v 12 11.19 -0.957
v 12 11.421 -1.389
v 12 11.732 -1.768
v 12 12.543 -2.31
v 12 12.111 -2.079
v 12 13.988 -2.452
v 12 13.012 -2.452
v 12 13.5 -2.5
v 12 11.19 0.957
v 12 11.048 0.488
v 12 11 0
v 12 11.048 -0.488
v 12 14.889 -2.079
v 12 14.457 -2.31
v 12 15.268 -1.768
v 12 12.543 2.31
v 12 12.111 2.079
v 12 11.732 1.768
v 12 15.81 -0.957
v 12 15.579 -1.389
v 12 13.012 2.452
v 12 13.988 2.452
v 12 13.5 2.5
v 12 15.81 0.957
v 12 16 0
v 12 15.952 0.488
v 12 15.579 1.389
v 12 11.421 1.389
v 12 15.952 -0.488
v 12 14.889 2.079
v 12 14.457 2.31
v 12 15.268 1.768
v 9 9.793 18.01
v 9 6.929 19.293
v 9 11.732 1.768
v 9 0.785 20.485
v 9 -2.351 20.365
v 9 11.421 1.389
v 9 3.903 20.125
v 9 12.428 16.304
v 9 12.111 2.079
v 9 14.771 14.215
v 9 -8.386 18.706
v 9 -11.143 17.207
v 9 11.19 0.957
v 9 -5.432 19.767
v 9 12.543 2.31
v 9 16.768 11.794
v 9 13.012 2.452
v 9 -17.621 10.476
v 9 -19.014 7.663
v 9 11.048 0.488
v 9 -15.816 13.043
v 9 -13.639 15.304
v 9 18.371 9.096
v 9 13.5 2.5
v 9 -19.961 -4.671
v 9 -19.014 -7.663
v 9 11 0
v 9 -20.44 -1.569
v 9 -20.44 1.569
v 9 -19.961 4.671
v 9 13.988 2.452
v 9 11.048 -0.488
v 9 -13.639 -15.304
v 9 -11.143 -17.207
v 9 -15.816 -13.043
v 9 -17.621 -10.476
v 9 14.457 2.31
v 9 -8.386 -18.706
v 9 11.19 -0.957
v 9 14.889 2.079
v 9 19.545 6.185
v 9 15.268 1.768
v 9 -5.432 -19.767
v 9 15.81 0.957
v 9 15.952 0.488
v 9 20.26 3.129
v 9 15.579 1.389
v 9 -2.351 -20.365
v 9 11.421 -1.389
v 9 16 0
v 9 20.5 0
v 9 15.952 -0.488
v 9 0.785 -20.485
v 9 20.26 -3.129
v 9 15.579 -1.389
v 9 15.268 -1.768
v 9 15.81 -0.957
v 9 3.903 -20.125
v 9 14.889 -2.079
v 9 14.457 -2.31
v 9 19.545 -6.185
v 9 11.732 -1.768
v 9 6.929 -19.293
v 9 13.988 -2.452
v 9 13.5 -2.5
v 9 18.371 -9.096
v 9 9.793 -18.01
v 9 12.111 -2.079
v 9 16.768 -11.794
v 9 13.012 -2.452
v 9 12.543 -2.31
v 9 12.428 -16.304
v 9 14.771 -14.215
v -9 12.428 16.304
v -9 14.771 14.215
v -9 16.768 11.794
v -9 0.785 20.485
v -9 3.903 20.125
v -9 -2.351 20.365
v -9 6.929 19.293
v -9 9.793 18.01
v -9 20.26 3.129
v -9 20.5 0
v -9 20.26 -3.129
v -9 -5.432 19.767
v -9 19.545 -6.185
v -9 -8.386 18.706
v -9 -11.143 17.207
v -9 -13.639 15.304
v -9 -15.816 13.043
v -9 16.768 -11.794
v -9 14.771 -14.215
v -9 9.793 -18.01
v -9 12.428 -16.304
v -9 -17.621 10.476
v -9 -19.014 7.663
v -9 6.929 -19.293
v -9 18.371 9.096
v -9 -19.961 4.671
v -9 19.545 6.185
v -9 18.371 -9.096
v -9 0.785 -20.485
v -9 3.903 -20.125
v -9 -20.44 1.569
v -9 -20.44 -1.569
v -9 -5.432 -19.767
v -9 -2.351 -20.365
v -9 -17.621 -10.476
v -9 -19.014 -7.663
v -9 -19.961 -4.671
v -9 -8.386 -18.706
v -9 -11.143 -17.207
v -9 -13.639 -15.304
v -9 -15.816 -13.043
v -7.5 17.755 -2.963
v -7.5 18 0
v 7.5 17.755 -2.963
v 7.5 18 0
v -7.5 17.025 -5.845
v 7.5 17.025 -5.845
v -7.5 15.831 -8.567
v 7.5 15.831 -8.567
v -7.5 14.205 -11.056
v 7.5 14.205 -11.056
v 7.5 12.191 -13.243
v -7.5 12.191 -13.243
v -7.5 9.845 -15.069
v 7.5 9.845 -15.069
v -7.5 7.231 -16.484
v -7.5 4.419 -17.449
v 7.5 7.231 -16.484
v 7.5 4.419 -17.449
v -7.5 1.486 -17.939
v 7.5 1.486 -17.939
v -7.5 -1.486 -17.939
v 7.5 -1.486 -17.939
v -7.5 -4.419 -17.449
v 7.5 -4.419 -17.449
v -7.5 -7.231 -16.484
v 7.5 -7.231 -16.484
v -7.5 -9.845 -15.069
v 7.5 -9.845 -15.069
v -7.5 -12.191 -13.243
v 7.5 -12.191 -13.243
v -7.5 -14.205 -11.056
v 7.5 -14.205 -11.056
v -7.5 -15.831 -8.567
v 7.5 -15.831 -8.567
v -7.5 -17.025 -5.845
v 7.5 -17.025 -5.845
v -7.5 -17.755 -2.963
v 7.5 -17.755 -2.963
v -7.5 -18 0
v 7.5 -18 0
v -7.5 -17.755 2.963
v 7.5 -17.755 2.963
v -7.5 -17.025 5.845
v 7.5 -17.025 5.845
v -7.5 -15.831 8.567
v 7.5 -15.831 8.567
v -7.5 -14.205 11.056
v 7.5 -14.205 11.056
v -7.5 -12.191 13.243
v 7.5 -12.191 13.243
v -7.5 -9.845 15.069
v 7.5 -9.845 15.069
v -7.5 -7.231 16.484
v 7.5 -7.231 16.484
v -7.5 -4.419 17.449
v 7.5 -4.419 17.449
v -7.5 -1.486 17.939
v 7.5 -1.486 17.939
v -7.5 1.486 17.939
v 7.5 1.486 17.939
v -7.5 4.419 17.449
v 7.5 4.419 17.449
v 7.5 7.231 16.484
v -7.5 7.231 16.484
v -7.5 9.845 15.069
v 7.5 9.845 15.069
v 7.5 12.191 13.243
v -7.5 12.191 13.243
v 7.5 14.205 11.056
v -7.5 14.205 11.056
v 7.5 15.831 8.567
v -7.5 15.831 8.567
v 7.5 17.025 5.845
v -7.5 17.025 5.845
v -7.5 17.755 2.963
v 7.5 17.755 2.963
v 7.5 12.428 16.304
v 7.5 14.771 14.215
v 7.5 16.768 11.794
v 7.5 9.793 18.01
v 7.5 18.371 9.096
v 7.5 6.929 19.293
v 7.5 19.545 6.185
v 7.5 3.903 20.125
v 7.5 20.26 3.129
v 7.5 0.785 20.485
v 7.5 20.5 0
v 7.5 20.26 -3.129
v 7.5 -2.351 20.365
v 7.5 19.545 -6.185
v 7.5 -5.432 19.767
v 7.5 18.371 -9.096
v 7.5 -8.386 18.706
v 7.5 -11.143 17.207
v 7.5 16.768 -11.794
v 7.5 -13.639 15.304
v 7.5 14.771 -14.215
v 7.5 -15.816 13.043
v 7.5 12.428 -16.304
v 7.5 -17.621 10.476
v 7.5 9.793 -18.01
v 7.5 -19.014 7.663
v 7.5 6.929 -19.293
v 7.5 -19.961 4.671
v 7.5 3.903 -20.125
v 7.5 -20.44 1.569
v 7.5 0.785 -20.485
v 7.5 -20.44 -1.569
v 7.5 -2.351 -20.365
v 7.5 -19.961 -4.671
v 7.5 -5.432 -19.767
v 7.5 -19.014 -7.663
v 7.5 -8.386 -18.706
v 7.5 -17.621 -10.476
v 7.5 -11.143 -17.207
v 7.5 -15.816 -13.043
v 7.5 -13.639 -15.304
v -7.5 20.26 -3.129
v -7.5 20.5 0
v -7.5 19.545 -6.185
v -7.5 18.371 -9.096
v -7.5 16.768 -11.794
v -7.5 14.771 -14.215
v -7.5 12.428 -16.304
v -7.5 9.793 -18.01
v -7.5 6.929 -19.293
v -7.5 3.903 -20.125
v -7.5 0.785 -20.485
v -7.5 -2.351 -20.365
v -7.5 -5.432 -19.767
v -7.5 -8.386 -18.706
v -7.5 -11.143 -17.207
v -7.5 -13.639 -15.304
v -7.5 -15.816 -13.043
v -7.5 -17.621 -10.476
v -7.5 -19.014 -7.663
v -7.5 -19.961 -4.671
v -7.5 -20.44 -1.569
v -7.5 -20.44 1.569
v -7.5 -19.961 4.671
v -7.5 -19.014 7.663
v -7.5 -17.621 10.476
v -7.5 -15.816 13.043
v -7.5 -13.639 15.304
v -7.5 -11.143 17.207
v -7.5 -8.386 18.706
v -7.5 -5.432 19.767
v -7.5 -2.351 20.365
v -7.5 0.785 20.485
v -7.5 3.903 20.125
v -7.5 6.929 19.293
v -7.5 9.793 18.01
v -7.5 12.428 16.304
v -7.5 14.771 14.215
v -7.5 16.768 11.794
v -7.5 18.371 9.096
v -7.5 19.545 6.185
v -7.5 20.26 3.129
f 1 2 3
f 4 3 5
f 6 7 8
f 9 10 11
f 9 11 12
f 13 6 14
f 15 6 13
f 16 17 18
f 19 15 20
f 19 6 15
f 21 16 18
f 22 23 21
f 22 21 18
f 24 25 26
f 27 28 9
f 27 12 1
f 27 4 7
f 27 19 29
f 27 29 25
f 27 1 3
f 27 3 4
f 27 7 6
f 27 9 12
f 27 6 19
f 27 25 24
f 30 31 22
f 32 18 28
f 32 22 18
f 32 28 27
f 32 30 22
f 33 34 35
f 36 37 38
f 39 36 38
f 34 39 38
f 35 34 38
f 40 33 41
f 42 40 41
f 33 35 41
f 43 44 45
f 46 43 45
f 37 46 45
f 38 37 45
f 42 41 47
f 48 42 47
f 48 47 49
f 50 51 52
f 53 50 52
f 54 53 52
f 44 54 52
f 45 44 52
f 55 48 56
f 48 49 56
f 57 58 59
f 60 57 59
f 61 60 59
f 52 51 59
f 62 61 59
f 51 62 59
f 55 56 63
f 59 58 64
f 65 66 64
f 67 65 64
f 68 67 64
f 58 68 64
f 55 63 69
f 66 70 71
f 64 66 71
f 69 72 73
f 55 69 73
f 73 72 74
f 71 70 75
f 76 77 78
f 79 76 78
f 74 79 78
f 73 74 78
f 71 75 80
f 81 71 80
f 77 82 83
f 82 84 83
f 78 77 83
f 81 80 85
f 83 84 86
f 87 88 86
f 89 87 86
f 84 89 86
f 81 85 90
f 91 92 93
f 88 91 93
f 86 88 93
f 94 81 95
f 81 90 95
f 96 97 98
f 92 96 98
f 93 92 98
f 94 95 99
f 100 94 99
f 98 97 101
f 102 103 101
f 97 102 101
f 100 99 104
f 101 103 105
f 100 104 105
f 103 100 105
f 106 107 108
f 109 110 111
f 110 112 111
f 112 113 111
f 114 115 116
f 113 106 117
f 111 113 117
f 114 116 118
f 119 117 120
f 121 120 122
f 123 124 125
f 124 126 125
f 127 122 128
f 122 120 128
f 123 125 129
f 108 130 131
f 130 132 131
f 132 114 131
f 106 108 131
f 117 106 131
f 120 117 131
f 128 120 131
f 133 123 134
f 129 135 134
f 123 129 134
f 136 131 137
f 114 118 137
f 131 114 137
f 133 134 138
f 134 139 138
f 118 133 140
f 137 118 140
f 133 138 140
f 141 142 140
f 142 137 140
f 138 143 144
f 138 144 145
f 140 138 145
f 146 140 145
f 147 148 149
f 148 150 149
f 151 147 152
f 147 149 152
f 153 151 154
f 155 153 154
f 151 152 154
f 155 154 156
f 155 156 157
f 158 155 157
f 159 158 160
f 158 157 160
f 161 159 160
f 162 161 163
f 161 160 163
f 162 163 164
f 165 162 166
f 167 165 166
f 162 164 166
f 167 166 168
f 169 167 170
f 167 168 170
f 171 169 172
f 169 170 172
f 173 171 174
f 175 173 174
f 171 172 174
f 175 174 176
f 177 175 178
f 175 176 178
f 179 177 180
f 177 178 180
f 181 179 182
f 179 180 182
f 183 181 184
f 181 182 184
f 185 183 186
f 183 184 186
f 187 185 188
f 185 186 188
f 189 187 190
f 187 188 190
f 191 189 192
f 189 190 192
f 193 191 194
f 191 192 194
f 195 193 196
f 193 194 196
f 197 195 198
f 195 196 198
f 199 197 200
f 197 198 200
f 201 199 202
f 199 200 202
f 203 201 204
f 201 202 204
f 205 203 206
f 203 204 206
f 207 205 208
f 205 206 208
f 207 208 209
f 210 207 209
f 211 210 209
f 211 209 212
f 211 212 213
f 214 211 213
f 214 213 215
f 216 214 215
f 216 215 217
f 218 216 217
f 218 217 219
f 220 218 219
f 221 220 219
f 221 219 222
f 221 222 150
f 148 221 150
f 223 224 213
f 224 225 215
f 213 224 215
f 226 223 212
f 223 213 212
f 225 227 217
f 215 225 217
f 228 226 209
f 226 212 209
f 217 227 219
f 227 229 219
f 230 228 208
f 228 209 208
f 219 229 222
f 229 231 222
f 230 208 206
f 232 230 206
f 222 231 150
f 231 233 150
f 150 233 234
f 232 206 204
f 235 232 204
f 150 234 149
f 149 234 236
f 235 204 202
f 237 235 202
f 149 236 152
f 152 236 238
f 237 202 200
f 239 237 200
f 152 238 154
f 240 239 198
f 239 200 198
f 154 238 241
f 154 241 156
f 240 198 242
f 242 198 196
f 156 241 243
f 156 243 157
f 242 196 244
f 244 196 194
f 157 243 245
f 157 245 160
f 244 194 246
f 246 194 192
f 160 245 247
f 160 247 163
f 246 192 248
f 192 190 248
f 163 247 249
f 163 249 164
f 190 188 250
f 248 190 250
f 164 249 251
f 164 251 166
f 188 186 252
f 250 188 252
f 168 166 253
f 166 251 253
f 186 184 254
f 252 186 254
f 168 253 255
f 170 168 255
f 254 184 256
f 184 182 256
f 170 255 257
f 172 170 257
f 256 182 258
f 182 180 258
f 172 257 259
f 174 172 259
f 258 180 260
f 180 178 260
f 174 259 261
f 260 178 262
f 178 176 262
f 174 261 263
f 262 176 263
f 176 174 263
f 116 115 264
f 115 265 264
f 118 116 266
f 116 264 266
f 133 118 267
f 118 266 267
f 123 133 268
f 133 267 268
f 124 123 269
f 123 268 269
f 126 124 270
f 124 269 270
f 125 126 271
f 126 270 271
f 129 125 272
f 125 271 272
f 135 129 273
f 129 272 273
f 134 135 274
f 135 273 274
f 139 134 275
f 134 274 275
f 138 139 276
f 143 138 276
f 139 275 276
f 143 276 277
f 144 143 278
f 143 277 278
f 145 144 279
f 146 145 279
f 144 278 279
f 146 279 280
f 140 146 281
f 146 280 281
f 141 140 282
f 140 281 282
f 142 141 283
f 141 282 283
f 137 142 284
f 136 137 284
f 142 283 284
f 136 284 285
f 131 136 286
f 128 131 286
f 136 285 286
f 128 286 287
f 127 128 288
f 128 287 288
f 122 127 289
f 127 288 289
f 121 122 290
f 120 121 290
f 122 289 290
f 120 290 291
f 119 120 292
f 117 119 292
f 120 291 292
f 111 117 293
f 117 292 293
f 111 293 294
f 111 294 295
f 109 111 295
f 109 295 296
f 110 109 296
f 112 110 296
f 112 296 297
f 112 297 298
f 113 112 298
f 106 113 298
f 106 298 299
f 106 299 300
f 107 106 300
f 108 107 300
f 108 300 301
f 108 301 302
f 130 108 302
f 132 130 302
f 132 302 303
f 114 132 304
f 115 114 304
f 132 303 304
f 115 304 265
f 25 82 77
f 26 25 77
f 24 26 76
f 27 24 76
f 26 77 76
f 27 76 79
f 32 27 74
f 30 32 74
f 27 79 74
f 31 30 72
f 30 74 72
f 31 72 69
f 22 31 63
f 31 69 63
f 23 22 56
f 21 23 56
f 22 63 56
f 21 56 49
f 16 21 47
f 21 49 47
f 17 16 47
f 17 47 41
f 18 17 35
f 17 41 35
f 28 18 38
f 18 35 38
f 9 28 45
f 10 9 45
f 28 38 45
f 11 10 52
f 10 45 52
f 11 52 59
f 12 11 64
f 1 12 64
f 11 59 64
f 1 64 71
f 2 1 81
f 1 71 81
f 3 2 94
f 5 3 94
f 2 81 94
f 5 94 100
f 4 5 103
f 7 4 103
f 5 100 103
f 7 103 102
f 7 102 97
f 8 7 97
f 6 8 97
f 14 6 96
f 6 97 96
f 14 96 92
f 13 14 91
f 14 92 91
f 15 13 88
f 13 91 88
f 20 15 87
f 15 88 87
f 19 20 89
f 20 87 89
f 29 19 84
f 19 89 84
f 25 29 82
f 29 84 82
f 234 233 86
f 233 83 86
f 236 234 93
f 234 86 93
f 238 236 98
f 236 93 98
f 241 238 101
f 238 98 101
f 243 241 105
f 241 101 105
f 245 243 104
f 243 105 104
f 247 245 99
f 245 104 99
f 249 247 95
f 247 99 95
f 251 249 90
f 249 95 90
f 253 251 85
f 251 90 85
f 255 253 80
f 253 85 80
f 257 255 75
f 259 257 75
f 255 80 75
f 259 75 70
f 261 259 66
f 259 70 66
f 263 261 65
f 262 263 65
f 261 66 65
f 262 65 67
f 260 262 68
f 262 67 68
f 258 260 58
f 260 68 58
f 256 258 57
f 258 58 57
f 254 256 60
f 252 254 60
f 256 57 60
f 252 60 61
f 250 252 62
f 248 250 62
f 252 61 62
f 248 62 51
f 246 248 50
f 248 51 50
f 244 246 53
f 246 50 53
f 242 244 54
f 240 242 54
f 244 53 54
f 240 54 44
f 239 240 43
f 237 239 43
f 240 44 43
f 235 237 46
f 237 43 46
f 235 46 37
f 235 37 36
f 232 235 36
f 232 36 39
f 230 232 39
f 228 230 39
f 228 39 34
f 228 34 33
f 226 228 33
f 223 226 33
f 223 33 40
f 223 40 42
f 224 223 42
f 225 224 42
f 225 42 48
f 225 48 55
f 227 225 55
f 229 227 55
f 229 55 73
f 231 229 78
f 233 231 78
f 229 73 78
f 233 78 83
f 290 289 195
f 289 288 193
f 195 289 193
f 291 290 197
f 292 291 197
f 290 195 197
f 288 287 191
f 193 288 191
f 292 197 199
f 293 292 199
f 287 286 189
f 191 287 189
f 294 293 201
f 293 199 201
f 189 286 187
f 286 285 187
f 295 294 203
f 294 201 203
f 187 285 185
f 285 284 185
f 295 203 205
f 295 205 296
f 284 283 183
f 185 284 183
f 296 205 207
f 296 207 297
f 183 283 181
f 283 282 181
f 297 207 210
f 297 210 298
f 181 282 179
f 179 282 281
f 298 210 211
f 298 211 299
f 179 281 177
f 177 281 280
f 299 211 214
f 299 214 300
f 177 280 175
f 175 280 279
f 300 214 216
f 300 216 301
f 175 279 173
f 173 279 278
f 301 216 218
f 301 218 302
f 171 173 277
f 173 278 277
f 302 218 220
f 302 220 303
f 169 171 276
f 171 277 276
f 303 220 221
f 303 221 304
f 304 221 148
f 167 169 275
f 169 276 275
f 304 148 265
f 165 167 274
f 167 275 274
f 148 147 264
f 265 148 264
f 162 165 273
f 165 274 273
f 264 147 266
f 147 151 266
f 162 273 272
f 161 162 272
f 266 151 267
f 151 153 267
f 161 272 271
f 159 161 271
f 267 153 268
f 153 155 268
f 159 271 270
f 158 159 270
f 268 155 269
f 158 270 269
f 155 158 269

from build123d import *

# Parameters (mm, degrees)
SKETCH2_R           = 2.5
BOSS_EXTRUDE1_DEPTH = 3


with BuildPart() as part:
    # Sketch1 → Revolve1 (revolve)
    with BuildSketch(Plane.XY):
        Polygon((9, 0), (-9, 0), (-9, 20.5), (-7.5, 20.5), (-7.5, 18), (7.5, 18), (7.5, 20.5), (9, 20.5), align=None)
    revolve(axis=Axis((9, 0, 0), (-1, 0, 0)))

    # Sketch2 → Boss-Extrude1 (add)
    with BuildSketch(Plane(origin=(9, 0, 0), x_dir=(0, 0, -1), z_dir=(1, 0, 0))):
        with Locations(Location((0, 13.5, 0), (0, 0, 90))):
            Circle(SKETCH2_R)
    extrude(amount=BOSS_EXTRUDE1_DEPTH)


solid = part.part
